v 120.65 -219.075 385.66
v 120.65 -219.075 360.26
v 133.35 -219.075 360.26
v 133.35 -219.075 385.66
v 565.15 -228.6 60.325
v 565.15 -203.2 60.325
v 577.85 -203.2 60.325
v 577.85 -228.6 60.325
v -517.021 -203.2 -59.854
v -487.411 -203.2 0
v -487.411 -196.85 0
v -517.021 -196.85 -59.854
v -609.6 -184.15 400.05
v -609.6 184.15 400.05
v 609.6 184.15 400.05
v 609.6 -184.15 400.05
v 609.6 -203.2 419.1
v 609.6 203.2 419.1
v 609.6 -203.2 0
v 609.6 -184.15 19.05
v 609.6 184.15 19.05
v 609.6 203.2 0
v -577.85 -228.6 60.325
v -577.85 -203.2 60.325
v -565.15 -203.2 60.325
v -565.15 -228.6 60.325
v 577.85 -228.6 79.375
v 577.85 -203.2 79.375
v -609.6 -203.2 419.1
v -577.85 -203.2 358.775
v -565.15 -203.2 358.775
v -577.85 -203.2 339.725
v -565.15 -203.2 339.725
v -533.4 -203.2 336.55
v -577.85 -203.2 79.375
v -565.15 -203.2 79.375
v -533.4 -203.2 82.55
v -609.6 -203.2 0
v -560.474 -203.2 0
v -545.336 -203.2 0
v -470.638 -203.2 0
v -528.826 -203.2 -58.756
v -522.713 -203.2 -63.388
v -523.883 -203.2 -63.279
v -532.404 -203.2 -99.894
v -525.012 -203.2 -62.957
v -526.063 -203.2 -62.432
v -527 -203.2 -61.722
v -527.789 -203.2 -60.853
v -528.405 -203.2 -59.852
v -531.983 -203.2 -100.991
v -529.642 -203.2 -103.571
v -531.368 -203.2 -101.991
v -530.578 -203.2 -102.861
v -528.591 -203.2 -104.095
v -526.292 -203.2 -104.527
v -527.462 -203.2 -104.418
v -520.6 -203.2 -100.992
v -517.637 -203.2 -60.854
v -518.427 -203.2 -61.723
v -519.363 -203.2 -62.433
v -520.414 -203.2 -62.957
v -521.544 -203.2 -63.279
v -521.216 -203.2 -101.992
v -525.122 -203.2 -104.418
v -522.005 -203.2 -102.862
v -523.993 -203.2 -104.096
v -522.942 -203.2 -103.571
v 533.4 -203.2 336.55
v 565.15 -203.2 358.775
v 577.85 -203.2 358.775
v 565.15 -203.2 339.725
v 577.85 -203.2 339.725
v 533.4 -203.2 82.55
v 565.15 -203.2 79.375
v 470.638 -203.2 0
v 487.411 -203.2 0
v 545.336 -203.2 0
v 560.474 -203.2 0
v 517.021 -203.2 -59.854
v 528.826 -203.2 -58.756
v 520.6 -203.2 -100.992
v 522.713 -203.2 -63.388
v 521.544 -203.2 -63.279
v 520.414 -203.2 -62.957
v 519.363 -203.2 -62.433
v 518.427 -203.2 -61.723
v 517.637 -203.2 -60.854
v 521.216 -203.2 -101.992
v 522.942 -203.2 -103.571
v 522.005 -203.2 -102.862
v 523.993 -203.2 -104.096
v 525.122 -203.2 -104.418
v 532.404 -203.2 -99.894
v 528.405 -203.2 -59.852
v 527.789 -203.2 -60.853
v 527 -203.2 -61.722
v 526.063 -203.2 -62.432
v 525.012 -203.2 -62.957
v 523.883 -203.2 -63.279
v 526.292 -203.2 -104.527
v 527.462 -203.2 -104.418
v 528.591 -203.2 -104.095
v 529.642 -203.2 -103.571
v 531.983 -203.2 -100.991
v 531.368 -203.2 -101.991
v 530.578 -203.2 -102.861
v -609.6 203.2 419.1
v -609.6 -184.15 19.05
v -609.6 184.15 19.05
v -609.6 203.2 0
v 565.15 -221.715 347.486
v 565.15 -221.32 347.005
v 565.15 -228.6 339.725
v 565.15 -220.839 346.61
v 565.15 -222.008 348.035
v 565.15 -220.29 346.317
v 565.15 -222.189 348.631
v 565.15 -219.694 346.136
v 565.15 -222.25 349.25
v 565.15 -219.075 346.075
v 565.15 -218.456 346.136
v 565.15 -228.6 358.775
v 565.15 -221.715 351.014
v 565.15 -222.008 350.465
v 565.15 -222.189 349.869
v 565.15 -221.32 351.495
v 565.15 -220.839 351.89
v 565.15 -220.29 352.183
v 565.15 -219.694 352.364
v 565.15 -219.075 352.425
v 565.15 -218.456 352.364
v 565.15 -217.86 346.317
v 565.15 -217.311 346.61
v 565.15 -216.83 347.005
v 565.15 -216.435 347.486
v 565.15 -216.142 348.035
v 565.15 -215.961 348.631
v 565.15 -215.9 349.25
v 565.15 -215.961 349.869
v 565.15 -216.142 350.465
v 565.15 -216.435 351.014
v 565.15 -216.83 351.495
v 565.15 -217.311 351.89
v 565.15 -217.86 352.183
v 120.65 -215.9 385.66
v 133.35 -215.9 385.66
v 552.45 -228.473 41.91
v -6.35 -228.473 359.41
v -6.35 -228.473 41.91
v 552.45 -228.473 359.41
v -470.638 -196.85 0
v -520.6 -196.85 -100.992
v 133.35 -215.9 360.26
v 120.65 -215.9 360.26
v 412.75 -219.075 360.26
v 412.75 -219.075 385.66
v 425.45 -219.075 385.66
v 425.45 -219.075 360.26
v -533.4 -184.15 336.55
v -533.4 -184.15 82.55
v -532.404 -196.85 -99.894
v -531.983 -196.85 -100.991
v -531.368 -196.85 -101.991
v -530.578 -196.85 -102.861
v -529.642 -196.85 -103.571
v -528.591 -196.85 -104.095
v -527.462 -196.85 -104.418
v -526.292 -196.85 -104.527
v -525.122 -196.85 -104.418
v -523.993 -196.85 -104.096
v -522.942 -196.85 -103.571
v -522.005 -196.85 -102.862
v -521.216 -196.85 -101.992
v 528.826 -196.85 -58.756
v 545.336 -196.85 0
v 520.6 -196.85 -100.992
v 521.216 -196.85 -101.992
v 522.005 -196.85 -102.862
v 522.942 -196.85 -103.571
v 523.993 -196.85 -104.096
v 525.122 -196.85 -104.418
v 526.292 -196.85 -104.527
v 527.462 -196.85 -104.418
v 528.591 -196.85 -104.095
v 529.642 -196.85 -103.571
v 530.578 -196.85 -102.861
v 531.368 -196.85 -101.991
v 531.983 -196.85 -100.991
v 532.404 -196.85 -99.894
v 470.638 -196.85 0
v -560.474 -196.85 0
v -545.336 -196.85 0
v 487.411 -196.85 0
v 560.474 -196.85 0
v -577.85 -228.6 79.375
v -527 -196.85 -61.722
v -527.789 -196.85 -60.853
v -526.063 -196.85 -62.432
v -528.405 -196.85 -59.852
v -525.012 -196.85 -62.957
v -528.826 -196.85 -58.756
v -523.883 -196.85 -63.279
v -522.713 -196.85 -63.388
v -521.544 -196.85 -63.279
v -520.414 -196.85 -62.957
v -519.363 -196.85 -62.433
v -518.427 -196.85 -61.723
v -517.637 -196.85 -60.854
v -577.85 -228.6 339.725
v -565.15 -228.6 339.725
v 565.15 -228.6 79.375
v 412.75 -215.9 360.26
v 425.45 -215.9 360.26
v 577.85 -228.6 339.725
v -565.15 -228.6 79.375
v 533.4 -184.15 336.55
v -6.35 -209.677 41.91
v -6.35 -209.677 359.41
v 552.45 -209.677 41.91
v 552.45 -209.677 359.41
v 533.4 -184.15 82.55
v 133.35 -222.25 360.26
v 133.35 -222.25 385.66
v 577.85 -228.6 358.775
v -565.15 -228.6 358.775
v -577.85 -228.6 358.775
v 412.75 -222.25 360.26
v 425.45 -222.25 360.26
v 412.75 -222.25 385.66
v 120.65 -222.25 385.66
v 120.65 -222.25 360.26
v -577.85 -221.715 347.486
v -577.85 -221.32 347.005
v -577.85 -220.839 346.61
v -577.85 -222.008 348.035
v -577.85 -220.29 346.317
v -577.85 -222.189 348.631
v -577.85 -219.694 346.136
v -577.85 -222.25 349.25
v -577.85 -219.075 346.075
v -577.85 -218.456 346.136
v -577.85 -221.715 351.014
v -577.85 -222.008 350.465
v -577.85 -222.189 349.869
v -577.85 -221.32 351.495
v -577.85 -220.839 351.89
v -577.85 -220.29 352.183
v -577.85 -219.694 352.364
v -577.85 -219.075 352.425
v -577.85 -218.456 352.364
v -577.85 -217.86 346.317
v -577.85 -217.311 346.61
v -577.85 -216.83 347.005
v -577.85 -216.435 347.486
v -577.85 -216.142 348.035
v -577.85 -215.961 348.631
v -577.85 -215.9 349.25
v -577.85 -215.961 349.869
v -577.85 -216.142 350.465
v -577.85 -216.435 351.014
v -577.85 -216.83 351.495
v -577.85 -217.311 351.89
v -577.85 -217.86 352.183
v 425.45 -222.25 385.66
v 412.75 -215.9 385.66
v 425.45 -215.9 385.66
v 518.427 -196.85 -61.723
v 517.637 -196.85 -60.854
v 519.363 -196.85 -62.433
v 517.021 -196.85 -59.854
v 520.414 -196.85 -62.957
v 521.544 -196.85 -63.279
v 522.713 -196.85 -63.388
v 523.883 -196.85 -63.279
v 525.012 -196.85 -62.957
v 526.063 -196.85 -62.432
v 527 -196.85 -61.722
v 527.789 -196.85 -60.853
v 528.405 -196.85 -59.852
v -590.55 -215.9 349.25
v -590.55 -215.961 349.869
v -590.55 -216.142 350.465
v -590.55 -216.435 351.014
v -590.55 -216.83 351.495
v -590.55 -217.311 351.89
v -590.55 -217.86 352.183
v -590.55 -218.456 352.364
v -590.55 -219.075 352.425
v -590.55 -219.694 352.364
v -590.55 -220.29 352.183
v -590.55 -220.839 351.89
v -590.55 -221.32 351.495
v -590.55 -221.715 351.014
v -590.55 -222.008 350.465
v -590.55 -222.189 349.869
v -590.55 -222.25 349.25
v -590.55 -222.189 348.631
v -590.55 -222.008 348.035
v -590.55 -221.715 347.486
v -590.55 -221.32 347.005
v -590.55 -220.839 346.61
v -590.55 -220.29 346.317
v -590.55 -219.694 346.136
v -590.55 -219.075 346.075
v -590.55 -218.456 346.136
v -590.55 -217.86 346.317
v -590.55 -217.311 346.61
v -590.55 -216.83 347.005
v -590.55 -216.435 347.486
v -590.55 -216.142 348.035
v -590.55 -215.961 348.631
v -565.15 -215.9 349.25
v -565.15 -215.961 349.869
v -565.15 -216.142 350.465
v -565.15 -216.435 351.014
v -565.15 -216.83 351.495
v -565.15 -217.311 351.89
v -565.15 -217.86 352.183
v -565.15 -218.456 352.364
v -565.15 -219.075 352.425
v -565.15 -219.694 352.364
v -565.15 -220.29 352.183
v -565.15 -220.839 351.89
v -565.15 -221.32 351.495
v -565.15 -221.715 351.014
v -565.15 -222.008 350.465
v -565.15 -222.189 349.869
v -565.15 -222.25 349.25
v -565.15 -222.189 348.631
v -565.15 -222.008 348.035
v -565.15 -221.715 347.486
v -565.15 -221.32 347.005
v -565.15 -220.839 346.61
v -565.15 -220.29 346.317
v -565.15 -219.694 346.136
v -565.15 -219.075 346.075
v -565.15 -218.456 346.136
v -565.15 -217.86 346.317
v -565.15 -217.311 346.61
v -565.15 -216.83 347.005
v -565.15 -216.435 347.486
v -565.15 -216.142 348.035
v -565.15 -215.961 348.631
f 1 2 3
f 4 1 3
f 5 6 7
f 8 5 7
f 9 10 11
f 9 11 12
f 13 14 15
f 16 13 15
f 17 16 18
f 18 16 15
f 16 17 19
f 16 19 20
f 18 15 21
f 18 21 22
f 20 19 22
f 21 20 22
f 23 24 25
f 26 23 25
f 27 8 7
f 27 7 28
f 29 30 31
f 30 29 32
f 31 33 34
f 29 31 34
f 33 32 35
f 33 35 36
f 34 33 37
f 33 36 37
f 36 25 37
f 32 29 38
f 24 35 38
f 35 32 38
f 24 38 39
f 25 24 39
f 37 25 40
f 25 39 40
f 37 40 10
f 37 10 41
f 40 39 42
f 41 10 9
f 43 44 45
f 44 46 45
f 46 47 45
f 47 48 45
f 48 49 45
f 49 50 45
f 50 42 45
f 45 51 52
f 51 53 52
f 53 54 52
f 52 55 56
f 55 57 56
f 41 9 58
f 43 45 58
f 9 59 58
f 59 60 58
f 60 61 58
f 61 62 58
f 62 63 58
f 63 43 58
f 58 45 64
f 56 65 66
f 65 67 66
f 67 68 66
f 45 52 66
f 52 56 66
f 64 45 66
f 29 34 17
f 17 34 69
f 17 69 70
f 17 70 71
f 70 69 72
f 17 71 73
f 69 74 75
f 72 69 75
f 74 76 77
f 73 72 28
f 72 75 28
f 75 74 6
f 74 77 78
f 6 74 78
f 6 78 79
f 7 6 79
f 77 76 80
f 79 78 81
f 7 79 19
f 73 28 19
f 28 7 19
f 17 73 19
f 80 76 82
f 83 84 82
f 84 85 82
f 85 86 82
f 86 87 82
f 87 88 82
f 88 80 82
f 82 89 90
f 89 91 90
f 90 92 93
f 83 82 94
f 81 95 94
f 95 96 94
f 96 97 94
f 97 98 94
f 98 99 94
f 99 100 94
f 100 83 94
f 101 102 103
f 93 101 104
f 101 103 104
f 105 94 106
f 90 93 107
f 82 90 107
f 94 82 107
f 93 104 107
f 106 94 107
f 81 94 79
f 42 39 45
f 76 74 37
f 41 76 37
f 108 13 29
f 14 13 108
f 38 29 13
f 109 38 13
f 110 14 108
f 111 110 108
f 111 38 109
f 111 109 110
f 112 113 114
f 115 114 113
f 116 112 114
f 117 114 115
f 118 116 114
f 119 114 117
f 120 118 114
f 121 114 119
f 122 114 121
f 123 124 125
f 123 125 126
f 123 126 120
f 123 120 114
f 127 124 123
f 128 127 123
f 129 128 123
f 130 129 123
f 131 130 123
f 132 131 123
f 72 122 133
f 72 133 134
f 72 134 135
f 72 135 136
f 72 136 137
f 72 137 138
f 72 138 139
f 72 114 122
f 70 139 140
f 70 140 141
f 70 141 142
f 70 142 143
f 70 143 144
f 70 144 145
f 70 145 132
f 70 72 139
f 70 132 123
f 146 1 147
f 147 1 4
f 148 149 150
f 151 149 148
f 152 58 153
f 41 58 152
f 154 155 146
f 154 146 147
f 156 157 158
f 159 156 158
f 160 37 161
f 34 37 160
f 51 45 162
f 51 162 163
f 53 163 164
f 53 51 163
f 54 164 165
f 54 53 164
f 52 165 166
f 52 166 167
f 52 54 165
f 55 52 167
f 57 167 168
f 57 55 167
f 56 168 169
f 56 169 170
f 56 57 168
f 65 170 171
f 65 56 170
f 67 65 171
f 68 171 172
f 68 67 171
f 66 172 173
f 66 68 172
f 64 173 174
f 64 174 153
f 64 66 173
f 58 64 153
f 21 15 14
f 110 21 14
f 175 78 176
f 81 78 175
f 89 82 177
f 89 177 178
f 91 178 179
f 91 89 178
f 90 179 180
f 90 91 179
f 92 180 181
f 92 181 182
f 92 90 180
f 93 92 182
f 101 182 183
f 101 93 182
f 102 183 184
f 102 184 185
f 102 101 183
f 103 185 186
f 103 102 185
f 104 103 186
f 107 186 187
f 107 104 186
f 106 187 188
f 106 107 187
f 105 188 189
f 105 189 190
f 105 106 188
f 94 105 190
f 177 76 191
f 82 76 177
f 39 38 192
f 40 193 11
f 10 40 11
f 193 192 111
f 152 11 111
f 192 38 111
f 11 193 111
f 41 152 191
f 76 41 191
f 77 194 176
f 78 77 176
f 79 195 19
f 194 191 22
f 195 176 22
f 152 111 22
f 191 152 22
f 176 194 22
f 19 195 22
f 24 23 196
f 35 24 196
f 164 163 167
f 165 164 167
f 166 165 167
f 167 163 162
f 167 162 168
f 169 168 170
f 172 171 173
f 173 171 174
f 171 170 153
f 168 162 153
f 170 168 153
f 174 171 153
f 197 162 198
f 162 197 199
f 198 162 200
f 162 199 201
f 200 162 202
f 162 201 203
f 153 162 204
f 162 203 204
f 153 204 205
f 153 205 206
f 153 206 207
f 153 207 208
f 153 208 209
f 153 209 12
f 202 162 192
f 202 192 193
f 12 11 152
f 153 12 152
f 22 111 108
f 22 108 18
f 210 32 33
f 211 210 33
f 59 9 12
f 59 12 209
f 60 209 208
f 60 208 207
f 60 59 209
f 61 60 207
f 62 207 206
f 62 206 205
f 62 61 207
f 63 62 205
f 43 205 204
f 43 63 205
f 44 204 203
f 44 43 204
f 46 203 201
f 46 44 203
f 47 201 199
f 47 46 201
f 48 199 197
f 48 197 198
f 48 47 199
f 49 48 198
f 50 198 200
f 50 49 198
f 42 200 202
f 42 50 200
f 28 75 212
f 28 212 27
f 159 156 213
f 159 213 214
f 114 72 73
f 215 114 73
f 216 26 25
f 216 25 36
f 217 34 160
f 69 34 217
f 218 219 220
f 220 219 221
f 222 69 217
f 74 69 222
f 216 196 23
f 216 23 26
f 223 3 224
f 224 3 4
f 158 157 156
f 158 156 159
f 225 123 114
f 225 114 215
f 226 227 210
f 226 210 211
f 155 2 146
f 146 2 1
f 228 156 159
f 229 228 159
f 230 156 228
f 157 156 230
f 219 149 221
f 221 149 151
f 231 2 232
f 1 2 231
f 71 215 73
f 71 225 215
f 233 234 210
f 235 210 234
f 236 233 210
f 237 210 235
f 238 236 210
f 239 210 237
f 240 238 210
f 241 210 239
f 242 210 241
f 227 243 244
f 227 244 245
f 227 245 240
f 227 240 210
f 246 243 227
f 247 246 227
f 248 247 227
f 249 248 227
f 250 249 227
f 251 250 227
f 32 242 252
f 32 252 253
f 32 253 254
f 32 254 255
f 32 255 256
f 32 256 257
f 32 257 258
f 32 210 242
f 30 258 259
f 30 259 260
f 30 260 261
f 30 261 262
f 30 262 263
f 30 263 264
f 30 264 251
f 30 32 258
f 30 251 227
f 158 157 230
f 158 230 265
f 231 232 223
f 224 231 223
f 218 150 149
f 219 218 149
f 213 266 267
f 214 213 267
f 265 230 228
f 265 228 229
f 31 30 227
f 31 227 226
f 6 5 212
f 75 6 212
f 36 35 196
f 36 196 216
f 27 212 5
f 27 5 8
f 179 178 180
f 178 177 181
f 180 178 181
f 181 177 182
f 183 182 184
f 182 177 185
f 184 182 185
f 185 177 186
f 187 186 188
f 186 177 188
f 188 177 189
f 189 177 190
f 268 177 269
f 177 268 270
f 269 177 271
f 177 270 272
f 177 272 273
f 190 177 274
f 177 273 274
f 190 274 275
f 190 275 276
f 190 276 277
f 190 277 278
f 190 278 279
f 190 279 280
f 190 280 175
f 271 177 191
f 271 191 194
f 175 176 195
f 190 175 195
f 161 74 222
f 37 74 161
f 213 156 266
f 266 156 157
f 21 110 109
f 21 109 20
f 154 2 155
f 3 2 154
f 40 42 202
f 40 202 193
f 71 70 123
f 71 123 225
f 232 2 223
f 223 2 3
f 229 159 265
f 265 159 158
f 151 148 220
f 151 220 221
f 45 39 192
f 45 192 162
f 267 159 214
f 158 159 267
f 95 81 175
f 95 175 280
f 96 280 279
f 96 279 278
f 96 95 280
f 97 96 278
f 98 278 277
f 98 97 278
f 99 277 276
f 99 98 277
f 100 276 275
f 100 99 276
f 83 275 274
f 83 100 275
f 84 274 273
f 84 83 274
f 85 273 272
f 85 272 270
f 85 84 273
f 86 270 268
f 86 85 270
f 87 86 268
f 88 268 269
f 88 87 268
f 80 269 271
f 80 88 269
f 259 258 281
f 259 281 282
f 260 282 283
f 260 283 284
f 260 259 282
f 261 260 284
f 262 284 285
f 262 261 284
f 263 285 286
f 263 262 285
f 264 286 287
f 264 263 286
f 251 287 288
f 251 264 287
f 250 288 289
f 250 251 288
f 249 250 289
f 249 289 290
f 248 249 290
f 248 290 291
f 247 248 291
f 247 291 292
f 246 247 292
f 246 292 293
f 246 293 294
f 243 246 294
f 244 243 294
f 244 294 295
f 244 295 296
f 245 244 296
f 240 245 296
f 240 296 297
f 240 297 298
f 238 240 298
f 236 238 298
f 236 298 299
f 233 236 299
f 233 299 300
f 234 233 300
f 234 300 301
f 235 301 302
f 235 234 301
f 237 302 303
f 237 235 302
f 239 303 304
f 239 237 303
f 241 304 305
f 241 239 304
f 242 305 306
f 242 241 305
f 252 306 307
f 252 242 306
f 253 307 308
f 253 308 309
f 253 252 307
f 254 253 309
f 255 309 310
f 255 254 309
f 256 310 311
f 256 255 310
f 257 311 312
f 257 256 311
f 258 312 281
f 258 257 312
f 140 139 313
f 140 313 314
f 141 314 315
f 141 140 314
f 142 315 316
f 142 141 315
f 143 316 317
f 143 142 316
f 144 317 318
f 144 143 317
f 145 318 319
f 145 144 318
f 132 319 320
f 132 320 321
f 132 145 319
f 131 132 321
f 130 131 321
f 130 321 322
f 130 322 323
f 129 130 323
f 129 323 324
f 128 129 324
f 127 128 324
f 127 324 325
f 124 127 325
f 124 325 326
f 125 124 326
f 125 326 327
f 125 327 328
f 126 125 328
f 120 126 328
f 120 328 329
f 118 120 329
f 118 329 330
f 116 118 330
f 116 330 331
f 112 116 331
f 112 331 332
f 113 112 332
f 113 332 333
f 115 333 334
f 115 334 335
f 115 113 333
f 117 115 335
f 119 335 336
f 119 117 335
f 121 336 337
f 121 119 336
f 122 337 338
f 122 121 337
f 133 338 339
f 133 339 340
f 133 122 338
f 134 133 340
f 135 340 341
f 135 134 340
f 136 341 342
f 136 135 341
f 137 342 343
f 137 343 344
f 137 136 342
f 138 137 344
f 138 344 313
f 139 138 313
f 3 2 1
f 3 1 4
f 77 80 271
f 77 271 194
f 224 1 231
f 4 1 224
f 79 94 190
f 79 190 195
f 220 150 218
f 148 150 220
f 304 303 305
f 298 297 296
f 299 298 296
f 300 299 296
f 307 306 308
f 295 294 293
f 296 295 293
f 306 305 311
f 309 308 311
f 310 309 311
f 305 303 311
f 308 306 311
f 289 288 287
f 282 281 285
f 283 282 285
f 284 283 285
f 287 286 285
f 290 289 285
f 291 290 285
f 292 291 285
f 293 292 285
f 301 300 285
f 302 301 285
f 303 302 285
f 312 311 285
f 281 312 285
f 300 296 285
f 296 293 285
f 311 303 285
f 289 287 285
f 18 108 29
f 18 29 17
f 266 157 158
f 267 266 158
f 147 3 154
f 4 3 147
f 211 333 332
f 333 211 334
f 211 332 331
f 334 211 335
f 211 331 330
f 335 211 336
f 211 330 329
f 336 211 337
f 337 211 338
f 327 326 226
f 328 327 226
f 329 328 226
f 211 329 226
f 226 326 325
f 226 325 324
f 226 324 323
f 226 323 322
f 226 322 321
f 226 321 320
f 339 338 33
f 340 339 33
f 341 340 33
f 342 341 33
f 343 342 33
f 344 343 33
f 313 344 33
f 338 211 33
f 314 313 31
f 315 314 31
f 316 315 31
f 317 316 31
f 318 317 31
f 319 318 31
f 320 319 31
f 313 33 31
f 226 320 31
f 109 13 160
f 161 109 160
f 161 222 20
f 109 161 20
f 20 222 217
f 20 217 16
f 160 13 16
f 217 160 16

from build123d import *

# Parameters (mm, degrees)
F0_W      = 1219.2
F0_H      = 406.4
F1_DEPTH  = 19.05
F2_W      = 1219.2
F2_H      = 381
F3_DEPTH  = 19.05
F4_W      = 1219.2
F4_H      = 381
F5_DEPTH  = 19.05
F6_W      = 1219.2
F6_H      = 406.4
F7_DEPTH  = 19.05
F8_W      = 12.7
F8_H      = 19.05
F9_DEPTH  = 25.4
F10_R     = 3.175
F11_DEPTH = 1168.4
F13_W     = 558.8
F13_H     = 317.5
F14_DEPTH = 9.398
F15_DEPTH = 9.398
F16_W     = 12.7
F16_H     = 25.4
F17_DEPTH = 3.175
F18_DEPTH = 3.175
F20_DEPTH = 6.35


with BuildPart() as f1:
    # F0 (on Top) → F1 (new body)
    with BuildSketch(Plane.XY):
        Rectangle(F0_W, F0_H)
    extrude(amount=F1_DEPTH)

    # F2 (on face) → F3 (join)
    with BuildSketch(Plane.XZ.offset(203.2)):
        with Locations((0, 209.55)):
            Rectangle(F2_W, F2_H)
        Polygon((-533.4, 336.55), (533.4, 336.55), (533.4, 82.55), (-533.4, 82.55), (-533.4, 209.55), align=None, mode=Mode.SUBTRACT)
    extrude(amount=-F3_DEPTH)

    # F4 (on face) → F5 (join)
    with BuildSketch(Plane(origin=(0, 203.2, 0), x_dir=(-1, 0, 0), z_dir=(0, 1, 0))):
        with Locations((0, 209.55)):
            Rectangle(F4_W, F4_H)
    extrude(amount=-F5_DEPTH)

    # F6 (on face) → F7 (join)
    with BuildSketch(Plane.XY.offset(400.05)):
        Rectangle(F6_W, F6_H)
    extrude(amount=F7_DEPTH)

    # F8 (on face) → F9 (join)
    with BuildSketch(Plane.XZ.offset(203.2)):
        with Locations((-571.5, 349.25)):
            Rectangle(F8_W, F8_H)
        with Locations((571.5, 349.25)):
            Rectangle(F8_W, F8_H)
        with Locations((-571.5, 69.85)):
            Rectangle(F8_W, F8_H)
        with Locations((571.5, 69.85)):
            Rectangle(F8_W, F8_H)
    extrude(amount=F9_DEPTH)

    # F10 (on face) → F11 (join)
    with BuildSketch(Plane.YZ.offset(577.85)):
        with Locations((-219.075, 349.25)):
            Circle(F10_R)
    extrude(amount=-F11_DEPTH)

    # F19 (on face) → F20 (join)
    with BuildSketch(Plane.XZ.offset(203.2)):
        with BuildLine():
            Line((532.4044498456, -99.8943697167), (560.4743361473, 0))
            Line((560.4743361473, 0), (545.3359361473, 0))
            Line((545.3359361473, 0), (528.8258187923, -58.7557694178))
            ThreePointArc((528.8258187923, -58.7557694178), (523.3006211592, -63.3606894596), (517.0209768489, -59.8536729482))
            Line((517.0209768489, -59.8536729482), (487.4107241631, 0))
            Line((487.4107241631, 0), (470.6376492977, 0))
            Line((470.6376492977, 0), (520.5996079022, -100.9922732471))
            ThreePointArc((520.5996079022, -100.9922732471), (526.8792522125, -104.4992897585), (532.4044498456, -99.8943697167))
        make_face()
        with BuildLine():
            Line((-545.3359361473, 0), (-560.4743361473, 0))
            Line((-560.4743361473, 0), (-532.4044498456, -99.8943697167))
            ThreePointArc((-532.4044498456, -99.8943697167), (-526.8792522125, -104.4992897585), (-520.5996079022, -100.9922732471))
            Line((-520.5996079022, -100.9922732471), (-470.6376492977, 0))
            Line((-470.6376492977, 0), (-487.4107241631, 0))
            Line((-487.4107241631, 0), (-517.0209768489, -59.8536729482))
            ThreePointArc((-517.0209768489, -59.8536729482), (-523.3006211592, -63.3606894596), (-528.8258187923, -58.7557694178))
            Line((-528.8258187923, -58.7557694178), (-545.3359361473, 0))
        make_face()
    extrude(amount=-F20_DEPTH)


with BuildPart() as f14:
    # F13 (on offset) → F14 (new body)
    with BuildSketch(Plane.XZ.offset(219.075)):
        with Locations((273.05, 200.66)):
            Rectangle(F13_W, F13_H)
    extrude(amount=F14_DEPTH)

    # F13 (on offset) → F15 (join)
    with BuildSketch(Plane.XZ.offset(219.075)):
        with Locations((273.05, 200.66)):
            Rectangle(F13_W, F13_H)
    extrude(amount=-F15_DEPTH)


with BuildPart() as f17:
    # F16 (on offset) → F17 (new body)
    with BuildSketch(Plane.XZ.offset(219.075)):
        with Locations((127, 372.9595031261)):
            Rectangle(F16_W, F16_H)
    extrude(amount=F17_DEPTH)


with BuildPart() as f17b:
    # F16 (on offset) → F17, piece 2 (new body)
    with BuildSketch(Plane.XZ.offset(219.075)):
        with Locations((419.1, 372.9595031261)):
            Rectangle(F16_W, F16_H)
    extrude(amount=F17_DEPTH)


with BuildPart() as f18:
    # F16 (on offset) → F18 (new body)
    with BuildSketch(Plane.XZ.offset(219.075)):
        with Locations((127, 372.9595031261)):
            Rectangle(F16_W, F16_H)
    extrude(amount=-F18_DEPTH)


with BuildPart() as f18b:
    # F16 (on offset) → F18, piece 2 (new body)
    with BuildSketch(Plane.XZ.offset(219.075)):
        with Locations((419.1, 372.9595031261)):
            Rectangle(F16_W, F16_H)
    extrude(amount=-F18_DEPTH)


solid = Compound([f1.part, f14.part, f17.part, f17b.part, f18.part, f18b.part])
